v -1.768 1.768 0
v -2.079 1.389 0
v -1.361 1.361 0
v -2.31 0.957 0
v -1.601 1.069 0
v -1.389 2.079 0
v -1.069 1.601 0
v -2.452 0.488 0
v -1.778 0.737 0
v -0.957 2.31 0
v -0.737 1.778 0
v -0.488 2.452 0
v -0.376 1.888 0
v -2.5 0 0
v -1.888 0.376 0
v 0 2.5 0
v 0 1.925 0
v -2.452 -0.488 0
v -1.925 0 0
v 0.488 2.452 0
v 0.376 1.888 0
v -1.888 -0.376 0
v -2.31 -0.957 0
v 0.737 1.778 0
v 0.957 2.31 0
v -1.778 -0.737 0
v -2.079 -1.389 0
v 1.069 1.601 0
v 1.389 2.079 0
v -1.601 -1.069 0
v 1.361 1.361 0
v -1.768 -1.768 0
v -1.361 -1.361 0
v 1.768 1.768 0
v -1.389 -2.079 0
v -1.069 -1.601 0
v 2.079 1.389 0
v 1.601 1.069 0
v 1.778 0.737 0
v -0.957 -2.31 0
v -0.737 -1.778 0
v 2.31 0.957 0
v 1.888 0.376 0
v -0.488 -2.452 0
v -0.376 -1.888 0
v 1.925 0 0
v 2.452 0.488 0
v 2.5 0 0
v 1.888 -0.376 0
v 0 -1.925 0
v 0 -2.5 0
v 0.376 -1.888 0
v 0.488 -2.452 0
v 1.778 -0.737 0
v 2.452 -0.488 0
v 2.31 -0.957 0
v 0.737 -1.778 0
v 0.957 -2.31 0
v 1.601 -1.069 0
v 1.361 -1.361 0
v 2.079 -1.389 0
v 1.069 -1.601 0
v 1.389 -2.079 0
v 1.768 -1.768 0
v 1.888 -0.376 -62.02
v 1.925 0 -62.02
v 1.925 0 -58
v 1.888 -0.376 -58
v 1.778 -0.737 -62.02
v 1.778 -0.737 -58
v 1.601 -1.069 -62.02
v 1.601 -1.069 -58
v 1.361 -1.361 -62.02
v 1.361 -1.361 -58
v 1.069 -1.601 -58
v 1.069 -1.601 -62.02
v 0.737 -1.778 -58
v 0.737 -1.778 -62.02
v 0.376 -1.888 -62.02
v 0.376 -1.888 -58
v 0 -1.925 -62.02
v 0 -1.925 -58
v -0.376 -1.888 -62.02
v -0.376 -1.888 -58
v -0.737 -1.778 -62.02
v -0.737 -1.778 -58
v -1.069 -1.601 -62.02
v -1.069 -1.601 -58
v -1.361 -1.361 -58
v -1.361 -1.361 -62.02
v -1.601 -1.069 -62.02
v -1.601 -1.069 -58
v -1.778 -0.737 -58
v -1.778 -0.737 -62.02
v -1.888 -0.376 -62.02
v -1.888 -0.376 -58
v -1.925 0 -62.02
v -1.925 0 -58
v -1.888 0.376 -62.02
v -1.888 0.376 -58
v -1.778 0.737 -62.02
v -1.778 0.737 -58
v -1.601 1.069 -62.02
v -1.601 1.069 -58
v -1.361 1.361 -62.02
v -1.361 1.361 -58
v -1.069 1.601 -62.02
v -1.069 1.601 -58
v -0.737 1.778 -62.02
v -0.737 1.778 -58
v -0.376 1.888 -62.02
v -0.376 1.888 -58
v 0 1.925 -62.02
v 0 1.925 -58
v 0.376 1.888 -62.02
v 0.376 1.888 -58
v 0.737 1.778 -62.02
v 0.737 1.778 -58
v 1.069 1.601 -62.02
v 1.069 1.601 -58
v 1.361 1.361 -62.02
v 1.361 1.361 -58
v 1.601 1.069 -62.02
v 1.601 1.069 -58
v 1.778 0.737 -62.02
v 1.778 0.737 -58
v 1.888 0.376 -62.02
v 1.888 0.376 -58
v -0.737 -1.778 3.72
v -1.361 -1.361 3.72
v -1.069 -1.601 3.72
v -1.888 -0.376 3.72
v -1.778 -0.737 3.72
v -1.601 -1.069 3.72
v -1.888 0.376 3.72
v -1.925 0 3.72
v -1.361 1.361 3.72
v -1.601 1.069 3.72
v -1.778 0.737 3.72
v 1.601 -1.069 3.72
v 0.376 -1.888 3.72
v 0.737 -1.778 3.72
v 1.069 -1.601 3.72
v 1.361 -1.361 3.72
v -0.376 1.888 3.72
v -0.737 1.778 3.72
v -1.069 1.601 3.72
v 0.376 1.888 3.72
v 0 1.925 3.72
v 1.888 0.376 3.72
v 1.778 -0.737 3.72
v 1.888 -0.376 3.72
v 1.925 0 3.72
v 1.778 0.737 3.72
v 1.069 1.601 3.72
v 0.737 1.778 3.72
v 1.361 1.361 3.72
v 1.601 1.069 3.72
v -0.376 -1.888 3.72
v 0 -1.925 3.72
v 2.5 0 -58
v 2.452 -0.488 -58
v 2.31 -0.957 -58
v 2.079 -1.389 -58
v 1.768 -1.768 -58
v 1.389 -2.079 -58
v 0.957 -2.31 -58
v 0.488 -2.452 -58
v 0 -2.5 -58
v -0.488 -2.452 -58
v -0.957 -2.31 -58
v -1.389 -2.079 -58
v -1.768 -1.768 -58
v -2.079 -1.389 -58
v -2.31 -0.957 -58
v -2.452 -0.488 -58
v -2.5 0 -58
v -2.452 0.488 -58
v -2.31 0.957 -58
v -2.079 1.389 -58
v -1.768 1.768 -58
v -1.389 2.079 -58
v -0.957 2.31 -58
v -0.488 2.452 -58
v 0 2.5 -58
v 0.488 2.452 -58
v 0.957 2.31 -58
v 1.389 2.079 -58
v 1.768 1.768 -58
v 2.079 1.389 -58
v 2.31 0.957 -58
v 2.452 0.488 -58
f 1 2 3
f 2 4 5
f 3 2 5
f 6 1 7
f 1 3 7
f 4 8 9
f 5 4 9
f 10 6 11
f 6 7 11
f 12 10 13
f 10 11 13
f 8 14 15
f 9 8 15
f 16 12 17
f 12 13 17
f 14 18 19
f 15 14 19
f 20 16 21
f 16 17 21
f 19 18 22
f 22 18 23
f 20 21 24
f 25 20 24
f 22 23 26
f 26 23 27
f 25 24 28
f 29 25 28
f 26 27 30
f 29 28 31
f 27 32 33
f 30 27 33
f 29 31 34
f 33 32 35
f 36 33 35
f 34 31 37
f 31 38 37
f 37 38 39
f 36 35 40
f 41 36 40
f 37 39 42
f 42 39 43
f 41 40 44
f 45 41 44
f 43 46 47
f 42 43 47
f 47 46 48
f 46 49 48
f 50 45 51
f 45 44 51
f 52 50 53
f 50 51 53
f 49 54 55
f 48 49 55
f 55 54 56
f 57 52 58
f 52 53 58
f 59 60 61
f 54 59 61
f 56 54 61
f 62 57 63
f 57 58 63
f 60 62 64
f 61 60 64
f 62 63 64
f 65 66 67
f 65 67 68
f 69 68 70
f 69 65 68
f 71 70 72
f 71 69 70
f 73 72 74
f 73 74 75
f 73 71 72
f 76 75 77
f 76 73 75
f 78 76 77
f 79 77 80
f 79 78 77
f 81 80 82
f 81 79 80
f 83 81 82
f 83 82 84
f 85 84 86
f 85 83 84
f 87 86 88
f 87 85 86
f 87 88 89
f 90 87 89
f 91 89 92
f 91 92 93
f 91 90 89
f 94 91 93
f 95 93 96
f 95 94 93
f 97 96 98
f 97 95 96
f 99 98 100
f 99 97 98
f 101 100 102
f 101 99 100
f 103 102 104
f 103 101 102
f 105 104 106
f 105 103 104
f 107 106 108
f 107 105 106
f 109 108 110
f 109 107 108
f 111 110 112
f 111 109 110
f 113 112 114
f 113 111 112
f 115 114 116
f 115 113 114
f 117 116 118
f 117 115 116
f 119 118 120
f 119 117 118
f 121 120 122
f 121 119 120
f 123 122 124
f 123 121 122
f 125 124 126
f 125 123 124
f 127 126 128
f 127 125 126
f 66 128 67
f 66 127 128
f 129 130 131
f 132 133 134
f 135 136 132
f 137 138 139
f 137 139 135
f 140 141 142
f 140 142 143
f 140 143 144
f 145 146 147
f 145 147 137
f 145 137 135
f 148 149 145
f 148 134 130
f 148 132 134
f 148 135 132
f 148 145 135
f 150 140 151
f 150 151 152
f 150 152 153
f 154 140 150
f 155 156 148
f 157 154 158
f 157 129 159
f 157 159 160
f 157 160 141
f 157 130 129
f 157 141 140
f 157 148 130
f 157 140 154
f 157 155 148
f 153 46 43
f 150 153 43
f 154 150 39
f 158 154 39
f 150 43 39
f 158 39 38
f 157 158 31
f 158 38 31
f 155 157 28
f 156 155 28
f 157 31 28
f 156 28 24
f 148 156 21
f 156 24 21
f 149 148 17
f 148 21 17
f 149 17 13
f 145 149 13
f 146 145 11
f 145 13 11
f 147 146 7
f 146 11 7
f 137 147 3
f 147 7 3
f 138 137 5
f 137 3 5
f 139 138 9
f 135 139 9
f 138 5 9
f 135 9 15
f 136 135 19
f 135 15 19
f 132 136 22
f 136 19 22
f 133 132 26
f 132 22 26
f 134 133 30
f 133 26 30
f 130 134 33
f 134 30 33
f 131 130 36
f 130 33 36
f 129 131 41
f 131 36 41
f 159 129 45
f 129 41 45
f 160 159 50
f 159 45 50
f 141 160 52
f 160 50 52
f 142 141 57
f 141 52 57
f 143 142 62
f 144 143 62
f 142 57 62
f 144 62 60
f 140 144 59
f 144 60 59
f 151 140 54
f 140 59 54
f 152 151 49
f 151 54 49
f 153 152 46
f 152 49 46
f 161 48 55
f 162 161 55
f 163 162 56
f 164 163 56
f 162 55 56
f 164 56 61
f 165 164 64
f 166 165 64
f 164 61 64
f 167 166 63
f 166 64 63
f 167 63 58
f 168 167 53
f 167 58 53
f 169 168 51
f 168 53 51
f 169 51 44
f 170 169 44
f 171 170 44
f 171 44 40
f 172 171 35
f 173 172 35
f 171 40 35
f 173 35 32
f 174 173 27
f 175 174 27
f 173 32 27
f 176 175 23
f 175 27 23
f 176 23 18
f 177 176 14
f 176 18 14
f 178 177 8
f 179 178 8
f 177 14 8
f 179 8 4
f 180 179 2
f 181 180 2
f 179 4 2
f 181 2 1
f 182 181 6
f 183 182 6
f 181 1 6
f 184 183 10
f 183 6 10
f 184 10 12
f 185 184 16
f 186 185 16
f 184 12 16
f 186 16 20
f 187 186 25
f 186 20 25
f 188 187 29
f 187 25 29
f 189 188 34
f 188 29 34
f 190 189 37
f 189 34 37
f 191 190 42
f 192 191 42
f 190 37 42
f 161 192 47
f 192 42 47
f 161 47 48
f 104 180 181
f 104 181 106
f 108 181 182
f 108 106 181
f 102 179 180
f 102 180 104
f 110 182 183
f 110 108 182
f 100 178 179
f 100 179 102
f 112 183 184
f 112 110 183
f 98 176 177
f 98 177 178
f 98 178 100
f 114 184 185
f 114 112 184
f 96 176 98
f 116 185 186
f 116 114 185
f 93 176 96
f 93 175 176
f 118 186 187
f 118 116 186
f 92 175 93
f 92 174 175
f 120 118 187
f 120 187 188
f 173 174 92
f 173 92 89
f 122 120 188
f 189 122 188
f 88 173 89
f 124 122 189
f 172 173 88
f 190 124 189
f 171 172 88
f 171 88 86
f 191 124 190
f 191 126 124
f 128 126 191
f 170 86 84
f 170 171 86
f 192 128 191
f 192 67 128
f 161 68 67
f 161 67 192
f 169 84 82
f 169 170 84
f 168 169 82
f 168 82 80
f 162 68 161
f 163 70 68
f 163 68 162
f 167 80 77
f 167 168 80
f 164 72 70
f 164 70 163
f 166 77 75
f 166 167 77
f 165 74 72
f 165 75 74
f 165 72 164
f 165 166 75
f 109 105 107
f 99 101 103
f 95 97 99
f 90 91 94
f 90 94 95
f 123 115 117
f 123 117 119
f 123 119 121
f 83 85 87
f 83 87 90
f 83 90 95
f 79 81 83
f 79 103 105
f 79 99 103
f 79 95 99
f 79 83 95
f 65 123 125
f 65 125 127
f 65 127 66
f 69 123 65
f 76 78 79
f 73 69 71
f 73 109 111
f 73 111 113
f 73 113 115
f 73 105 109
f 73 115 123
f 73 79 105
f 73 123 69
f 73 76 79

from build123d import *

# Parameters (mm, degrees)
SKETCH_1_R      = 1.925
EXTRUDE_1_DEPTH = 3.72
SKETCH_2_R      = 2.5
EXTRUDE_2_DEPTH = 58
EXTRUDE_START   = 4.02
SKETCH_3_R      = 1.925
EXTRUDE_3_DEPTH = 4.02


with BuildPart() as part:
    # 草图1 → 凸台-拉伸1 (new body)
    with BuildSketch(Plane.XY):
        Circle(SKETCH_1_R)
    extrude(amount=EXTRUDE_1_DEPTH)

    # 草图2 → 凸台-拉伸2 (add)
    with BuildSketch(Plane(origin=(0, 0, 0), x_dir=(-1, 0, 0), z_dir=(0, 0, -1))):
        with Locations(Location((0, 0, 0), (0, 0, 180))):
            Circle(SKETCH_2_R)
    extrude(amount=EXTRUDE_2_DEPTH)

    # 草图3 → 凸台-拉伸3 (add)
    with BuildSketch(Plane(origin=(0, 0, -58), x_dir=(-1, 0, 0), z_dir=(0, 0, -1)).offset(EXTRUDE_START)):
        with Locations(Location((0, 0, 0), (0, 0, 180))):
            Circle(SKETCH_3_R)
    extrude(amount=-EXTRUDE_3_DEPTH)


solid = part.part
